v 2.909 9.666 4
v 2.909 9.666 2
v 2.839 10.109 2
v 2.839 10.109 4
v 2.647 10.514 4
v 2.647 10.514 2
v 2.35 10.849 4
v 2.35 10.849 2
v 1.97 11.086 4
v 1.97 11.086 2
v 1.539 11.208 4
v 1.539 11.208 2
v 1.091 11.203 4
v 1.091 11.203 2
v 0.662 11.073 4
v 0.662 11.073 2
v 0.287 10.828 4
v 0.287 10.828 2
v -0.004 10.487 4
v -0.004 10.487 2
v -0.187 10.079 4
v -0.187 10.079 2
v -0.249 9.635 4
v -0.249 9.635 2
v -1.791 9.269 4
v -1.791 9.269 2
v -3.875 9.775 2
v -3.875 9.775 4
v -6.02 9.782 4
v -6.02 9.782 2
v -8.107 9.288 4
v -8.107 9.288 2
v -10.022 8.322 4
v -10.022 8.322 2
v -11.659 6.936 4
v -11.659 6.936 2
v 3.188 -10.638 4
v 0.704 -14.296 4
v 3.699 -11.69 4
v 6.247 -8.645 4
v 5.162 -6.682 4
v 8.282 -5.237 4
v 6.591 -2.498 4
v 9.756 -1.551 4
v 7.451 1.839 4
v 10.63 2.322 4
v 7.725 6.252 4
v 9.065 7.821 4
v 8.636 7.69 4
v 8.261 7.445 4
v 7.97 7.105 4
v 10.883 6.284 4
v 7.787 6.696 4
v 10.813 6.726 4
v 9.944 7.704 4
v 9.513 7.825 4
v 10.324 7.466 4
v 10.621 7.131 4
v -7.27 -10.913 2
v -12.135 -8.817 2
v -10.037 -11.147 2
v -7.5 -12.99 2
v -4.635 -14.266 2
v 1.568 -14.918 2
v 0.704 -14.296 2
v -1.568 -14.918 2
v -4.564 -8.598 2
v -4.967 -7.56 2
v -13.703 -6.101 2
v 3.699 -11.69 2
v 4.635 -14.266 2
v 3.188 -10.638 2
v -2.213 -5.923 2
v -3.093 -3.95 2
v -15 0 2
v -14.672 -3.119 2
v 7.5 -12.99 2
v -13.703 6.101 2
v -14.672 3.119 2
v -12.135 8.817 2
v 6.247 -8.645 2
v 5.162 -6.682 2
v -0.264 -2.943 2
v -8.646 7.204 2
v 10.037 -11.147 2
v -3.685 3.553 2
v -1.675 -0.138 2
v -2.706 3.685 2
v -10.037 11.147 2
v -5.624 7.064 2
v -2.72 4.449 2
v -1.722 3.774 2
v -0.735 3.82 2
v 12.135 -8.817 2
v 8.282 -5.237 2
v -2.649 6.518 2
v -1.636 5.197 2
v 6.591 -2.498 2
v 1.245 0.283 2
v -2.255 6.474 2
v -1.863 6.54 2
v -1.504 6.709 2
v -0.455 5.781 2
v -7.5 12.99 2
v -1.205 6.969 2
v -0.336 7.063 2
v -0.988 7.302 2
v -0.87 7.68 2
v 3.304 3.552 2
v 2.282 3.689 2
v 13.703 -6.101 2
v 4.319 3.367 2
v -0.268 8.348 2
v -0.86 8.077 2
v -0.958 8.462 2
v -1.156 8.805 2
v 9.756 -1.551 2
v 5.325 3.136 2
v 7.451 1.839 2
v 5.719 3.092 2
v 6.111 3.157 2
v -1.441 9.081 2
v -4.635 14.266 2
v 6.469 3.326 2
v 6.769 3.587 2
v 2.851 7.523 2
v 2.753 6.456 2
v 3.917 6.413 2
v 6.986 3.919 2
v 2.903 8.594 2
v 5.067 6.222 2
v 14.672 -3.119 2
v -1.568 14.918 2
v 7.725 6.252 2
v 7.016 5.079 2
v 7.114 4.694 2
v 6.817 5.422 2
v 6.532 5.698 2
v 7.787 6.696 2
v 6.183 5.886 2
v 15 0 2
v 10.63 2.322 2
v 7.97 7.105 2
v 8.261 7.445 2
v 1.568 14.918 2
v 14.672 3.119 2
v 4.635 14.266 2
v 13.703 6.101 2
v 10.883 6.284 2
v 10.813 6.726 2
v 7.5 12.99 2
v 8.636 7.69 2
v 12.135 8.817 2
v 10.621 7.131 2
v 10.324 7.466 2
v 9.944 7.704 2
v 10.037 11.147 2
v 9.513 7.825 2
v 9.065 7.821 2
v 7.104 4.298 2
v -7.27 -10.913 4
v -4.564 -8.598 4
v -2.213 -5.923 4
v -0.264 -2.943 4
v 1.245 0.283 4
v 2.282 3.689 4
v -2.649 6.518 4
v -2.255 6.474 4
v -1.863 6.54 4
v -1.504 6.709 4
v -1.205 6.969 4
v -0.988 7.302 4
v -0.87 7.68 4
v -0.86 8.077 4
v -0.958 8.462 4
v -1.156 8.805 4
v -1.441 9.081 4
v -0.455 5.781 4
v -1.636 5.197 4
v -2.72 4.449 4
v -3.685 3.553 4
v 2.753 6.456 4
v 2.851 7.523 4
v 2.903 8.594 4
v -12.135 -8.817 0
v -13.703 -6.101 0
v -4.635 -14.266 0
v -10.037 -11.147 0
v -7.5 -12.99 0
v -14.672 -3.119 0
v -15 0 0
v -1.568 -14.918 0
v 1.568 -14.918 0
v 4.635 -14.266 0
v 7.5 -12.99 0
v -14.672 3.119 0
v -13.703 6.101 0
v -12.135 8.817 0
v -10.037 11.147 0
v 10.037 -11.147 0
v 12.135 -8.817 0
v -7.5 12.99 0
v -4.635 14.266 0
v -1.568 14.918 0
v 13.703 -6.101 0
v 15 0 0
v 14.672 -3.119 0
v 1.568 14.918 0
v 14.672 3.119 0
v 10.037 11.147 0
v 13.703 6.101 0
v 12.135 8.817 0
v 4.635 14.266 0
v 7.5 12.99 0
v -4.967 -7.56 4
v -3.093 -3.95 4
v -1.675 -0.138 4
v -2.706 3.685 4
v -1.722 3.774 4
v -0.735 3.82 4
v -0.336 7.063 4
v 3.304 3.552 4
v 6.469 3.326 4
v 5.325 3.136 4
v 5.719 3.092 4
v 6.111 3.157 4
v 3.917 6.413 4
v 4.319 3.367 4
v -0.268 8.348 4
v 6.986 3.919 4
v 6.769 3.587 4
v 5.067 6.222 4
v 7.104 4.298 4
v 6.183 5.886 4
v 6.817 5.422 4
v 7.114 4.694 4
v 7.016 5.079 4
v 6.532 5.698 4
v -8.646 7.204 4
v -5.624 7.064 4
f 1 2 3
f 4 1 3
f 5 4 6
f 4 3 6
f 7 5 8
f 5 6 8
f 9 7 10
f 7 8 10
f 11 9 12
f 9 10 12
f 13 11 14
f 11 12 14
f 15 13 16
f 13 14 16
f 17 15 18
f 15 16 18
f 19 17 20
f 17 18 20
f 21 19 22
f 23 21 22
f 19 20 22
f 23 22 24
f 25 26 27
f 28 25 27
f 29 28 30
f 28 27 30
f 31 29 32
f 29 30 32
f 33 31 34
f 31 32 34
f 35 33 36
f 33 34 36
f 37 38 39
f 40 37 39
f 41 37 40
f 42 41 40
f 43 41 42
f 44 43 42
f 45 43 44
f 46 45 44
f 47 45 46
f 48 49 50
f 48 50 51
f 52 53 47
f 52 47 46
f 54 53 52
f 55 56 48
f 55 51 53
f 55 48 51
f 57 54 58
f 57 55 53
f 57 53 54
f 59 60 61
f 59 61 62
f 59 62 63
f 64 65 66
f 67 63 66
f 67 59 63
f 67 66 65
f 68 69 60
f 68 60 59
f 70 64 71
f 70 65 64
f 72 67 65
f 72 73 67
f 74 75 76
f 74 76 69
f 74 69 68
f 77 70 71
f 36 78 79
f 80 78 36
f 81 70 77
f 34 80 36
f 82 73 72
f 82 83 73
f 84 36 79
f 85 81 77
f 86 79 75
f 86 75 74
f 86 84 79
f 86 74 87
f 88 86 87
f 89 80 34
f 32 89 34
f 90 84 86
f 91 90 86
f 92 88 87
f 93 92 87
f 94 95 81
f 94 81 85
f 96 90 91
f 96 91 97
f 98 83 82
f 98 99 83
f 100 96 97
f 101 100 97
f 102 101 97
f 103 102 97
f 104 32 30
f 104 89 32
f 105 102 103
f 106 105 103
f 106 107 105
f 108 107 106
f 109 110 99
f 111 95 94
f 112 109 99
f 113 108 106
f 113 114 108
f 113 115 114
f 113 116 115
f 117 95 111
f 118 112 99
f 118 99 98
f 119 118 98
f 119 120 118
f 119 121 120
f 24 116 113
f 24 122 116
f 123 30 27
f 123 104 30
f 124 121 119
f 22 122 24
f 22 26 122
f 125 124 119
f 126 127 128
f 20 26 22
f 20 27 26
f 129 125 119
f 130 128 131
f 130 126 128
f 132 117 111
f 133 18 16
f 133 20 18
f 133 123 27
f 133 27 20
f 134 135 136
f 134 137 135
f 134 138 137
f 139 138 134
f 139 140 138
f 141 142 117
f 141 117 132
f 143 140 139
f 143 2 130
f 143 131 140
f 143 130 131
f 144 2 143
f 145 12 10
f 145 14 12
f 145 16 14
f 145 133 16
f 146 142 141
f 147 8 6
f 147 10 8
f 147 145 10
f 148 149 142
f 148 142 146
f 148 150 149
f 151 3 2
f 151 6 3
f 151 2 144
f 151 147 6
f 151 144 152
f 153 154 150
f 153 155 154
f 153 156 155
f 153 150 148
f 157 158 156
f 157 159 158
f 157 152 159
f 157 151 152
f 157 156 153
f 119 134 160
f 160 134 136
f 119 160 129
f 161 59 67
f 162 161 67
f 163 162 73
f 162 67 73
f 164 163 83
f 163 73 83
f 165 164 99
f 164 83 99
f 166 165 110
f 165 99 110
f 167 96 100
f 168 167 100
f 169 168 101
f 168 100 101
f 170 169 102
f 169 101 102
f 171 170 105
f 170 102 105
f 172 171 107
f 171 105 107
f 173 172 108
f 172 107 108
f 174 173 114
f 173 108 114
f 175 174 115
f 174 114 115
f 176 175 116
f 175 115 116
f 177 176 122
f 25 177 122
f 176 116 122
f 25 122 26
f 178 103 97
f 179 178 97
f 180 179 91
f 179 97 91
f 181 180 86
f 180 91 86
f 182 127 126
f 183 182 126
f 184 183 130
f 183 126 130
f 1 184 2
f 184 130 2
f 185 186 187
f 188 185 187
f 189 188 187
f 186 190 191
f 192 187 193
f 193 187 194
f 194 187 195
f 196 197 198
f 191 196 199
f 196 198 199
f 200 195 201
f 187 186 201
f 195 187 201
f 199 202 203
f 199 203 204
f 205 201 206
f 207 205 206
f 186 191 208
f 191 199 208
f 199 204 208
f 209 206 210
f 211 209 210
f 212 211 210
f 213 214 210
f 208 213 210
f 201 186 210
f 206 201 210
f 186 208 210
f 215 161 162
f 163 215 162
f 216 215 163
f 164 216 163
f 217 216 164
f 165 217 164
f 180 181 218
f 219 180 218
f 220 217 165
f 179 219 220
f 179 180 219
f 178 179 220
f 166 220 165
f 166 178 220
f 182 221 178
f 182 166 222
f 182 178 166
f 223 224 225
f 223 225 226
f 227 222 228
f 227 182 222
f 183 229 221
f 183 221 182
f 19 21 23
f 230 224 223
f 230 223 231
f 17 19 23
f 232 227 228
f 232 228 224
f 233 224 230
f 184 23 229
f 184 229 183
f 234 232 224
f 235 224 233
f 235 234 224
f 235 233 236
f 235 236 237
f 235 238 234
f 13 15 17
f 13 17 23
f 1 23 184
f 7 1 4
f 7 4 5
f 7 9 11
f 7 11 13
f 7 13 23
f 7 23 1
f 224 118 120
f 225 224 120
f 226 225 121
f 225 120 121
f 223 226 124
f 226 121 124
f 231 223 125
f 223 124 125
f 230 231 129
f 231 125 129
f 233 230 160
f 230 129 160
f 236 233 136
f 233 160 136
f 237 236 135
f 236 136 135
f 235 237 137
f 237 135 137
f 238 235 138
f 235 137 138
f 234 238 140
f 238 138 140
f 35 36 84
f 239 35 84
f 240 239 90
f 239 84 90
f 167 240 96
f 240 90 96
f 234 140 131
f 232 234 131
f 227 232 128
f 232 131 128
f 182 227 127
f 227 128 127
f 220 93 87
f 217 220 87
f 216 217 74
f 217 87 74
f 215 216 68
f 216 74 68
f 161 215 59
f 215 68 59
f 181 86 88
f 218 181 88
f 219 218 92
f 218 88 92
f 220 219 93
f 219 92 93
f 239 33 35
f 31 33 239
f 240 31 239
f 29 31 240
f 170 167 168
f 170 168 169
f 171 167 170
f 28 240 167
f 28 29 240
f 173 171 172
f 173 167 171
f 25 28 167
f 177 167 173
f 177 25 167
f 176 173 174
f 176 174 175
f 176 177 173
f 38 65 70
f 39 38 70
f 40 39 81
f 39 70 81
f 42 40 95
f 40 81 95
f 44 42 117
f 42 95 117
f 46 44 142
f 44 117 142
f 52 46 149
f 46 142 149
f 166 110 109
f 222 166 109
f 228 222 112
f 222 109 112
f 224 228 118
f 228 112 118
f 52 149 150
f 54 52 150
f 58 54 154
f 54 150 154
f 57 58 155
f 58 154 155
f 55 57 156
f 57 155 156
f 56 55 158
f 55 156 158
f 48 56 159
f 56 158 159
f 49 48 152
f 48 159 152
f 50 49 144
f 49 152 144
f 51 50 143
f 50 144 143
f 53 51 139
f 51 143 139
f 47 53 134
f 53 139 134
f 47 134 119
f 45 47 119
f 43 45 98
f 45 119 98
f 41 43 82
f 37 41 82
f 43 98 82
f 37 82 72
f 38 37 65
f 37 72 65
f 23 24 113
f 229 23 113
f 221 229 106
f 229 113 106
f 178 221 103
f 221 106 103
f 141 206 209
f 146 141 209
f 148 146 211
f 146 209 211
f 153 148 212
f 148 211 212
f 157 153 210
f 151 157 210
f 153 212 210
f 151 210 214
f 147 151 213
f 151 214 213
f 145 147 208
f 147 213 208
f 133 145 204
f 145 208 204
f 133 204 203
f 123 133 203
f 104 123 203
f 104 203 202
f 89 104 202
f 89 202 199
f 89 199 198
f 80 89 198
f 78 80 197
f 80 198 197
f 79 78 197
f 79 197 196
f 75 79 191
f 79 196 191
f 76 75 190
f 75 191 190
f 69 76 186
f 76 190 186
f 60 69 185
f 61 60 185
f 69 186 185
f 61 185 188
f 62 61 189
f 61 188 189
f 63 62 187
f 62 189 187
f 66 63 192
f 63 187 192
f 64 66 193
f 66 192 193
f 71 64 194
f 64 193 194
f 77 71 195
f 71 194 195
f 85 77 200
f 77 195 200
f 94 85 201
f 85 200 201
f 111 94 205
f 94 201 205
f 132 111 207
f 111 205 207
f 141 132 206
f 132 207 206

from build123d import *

# Parameters (mm, degrees)
F0_R     = 15
F1_DEPTH = 2
F3_DEPTH = 2


with BuildPart() as f1:
    # F0 (on Top) → F1 (new body)
    with BuildSketch(Plane.XY):
        Circle(F0_R)
    extrude(amount=F1_DEPTH)

    # F2 (on face) → F3 (join)
    with BuildSketch(Plane.XY.offset(2)):
        with BuildLine():
            ThreePointArc((-11.658853, 6.935612), (-7.132737, 7.1853), (-2.649061, 6.518432))
            ThreePointArc((-2.649061, 6.518432), (-0.916188, 7.486954), (-1.790806, 9.269067))
            ThreePointArc((-1.790806, 9.269067), (-7.078127, 9.596414), (-11.658853, 6.935612))
        make_face()
        with BuildLine():
            ThreePointArc((2.752731, 6.455697), (2.882497, 8.058589), (2.909441, 9.6665))
            ThreePointArc((2.909441, 9.6665), (1.314728, 11.221448), (-0.248597, 9.634947))
            ThreePointArc((-0.248597, 9.634947), (-0.29574, 7.705033), (-0.45524, 5.781143))
            ThreePointArc((-0.45524, 5.781143), (-2.191095, 4.842409), (-3.684971, 3.552933))
            ThreePointArc((-3.684971, 3.552933), (-2.214478, 3.73532), (-0.735143, 3.820066))
            ThreePointArc((-0.735143, 3.820066), (-3.092594, -3.950169), (-7.269774, -10.913309))
            ThreePointArc((-7.269774, -10.913309), (-1.185509, -4.467947), (2.281617, 3.689258))
            ThreePointArc((2.281617, 3.689258), (3.812787, 3.465108), (5.324822, 3.135752))
            ThreePointArc((5.324822, 3.135752), (7.057695, 4.104274), (6.183076, 5.886387))
            ThreePointArc((6.183076, 5.886387), (4.495229, 6.335689), (2.752731, 6.455697))
        make_face()
        with BuildLine():
            ThreePointArc((0.704108, -14.295988), (8.282362, -5.237022), (10.883323, 6.28382))
            ThreePointArc((10.883323, 6.28382), (9.288611, 7.838769), (7.725285, 6.252267))
            ThreePointArc((7.725285, 6.252267), (5.946495, -4.613602), (0.704108, -14.295988))
        make_face()
    extrude(amount=F3_DEPTH)


solid = f1.part
